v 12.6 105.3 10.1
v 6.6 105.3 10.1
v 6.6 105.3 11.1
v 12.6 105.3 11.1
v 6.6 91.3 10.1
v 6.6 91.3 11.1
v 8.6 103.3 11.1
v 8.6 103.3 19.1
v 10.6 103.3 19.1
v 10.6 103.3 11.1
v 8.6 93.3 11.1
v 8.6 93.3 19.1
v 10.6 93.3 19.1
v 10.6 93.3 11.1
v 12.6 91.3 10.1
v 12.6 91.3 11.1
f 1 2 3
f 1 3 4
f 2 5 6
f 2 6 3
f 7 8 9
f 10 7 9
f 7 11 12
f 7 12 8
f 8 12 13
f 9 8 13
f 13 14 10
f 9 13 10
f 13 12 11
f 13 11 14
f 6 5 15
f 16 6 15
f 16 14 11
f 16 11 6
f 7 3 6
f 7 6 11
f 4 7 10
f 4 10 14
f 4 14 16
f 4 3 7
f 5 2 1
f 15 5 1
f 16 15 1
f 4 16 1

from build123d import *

# Parameters (mm, degrees)
BOX022_W     = 2
BOX022_H     = 10
BOX022_DEPTH = 9
BOX024_W     = 6
BOX024_H     = 14
BOX024_DEPTH = 1


with BuildPart() as onoff_button_rec_c:
    # Box022 → Box022 (new body)
    with BuildSketch(Plane(origin=(8.6, 93.3, 10.1), x_dir=(1, 0, 0), z_dir=(0, 0, 1))):
        with Locations((1, 5)):
            Rectangle(BOX022_W, BOX022_H)
    extrude(amount=BOX022_DEPTH)


with BuildPart() as onoff_button_rec:
    # Box024 → Box024 (new body)
    with BuildSketch(Plane(origin=(6.6, 91.3, 10.1), x_dir=(1, 0, 0), z_dir=(0, 0, 1))):
        with Locations((3, 7)):
            Rectangle(BOX024_W, BOX024_H)
    extrude(amount=BOX024_DEPTH)

    # Fusion037: union onoff_button_rec_c
    add(onoff_button_rec_c.part)


solid = onoff_button_rec.part
